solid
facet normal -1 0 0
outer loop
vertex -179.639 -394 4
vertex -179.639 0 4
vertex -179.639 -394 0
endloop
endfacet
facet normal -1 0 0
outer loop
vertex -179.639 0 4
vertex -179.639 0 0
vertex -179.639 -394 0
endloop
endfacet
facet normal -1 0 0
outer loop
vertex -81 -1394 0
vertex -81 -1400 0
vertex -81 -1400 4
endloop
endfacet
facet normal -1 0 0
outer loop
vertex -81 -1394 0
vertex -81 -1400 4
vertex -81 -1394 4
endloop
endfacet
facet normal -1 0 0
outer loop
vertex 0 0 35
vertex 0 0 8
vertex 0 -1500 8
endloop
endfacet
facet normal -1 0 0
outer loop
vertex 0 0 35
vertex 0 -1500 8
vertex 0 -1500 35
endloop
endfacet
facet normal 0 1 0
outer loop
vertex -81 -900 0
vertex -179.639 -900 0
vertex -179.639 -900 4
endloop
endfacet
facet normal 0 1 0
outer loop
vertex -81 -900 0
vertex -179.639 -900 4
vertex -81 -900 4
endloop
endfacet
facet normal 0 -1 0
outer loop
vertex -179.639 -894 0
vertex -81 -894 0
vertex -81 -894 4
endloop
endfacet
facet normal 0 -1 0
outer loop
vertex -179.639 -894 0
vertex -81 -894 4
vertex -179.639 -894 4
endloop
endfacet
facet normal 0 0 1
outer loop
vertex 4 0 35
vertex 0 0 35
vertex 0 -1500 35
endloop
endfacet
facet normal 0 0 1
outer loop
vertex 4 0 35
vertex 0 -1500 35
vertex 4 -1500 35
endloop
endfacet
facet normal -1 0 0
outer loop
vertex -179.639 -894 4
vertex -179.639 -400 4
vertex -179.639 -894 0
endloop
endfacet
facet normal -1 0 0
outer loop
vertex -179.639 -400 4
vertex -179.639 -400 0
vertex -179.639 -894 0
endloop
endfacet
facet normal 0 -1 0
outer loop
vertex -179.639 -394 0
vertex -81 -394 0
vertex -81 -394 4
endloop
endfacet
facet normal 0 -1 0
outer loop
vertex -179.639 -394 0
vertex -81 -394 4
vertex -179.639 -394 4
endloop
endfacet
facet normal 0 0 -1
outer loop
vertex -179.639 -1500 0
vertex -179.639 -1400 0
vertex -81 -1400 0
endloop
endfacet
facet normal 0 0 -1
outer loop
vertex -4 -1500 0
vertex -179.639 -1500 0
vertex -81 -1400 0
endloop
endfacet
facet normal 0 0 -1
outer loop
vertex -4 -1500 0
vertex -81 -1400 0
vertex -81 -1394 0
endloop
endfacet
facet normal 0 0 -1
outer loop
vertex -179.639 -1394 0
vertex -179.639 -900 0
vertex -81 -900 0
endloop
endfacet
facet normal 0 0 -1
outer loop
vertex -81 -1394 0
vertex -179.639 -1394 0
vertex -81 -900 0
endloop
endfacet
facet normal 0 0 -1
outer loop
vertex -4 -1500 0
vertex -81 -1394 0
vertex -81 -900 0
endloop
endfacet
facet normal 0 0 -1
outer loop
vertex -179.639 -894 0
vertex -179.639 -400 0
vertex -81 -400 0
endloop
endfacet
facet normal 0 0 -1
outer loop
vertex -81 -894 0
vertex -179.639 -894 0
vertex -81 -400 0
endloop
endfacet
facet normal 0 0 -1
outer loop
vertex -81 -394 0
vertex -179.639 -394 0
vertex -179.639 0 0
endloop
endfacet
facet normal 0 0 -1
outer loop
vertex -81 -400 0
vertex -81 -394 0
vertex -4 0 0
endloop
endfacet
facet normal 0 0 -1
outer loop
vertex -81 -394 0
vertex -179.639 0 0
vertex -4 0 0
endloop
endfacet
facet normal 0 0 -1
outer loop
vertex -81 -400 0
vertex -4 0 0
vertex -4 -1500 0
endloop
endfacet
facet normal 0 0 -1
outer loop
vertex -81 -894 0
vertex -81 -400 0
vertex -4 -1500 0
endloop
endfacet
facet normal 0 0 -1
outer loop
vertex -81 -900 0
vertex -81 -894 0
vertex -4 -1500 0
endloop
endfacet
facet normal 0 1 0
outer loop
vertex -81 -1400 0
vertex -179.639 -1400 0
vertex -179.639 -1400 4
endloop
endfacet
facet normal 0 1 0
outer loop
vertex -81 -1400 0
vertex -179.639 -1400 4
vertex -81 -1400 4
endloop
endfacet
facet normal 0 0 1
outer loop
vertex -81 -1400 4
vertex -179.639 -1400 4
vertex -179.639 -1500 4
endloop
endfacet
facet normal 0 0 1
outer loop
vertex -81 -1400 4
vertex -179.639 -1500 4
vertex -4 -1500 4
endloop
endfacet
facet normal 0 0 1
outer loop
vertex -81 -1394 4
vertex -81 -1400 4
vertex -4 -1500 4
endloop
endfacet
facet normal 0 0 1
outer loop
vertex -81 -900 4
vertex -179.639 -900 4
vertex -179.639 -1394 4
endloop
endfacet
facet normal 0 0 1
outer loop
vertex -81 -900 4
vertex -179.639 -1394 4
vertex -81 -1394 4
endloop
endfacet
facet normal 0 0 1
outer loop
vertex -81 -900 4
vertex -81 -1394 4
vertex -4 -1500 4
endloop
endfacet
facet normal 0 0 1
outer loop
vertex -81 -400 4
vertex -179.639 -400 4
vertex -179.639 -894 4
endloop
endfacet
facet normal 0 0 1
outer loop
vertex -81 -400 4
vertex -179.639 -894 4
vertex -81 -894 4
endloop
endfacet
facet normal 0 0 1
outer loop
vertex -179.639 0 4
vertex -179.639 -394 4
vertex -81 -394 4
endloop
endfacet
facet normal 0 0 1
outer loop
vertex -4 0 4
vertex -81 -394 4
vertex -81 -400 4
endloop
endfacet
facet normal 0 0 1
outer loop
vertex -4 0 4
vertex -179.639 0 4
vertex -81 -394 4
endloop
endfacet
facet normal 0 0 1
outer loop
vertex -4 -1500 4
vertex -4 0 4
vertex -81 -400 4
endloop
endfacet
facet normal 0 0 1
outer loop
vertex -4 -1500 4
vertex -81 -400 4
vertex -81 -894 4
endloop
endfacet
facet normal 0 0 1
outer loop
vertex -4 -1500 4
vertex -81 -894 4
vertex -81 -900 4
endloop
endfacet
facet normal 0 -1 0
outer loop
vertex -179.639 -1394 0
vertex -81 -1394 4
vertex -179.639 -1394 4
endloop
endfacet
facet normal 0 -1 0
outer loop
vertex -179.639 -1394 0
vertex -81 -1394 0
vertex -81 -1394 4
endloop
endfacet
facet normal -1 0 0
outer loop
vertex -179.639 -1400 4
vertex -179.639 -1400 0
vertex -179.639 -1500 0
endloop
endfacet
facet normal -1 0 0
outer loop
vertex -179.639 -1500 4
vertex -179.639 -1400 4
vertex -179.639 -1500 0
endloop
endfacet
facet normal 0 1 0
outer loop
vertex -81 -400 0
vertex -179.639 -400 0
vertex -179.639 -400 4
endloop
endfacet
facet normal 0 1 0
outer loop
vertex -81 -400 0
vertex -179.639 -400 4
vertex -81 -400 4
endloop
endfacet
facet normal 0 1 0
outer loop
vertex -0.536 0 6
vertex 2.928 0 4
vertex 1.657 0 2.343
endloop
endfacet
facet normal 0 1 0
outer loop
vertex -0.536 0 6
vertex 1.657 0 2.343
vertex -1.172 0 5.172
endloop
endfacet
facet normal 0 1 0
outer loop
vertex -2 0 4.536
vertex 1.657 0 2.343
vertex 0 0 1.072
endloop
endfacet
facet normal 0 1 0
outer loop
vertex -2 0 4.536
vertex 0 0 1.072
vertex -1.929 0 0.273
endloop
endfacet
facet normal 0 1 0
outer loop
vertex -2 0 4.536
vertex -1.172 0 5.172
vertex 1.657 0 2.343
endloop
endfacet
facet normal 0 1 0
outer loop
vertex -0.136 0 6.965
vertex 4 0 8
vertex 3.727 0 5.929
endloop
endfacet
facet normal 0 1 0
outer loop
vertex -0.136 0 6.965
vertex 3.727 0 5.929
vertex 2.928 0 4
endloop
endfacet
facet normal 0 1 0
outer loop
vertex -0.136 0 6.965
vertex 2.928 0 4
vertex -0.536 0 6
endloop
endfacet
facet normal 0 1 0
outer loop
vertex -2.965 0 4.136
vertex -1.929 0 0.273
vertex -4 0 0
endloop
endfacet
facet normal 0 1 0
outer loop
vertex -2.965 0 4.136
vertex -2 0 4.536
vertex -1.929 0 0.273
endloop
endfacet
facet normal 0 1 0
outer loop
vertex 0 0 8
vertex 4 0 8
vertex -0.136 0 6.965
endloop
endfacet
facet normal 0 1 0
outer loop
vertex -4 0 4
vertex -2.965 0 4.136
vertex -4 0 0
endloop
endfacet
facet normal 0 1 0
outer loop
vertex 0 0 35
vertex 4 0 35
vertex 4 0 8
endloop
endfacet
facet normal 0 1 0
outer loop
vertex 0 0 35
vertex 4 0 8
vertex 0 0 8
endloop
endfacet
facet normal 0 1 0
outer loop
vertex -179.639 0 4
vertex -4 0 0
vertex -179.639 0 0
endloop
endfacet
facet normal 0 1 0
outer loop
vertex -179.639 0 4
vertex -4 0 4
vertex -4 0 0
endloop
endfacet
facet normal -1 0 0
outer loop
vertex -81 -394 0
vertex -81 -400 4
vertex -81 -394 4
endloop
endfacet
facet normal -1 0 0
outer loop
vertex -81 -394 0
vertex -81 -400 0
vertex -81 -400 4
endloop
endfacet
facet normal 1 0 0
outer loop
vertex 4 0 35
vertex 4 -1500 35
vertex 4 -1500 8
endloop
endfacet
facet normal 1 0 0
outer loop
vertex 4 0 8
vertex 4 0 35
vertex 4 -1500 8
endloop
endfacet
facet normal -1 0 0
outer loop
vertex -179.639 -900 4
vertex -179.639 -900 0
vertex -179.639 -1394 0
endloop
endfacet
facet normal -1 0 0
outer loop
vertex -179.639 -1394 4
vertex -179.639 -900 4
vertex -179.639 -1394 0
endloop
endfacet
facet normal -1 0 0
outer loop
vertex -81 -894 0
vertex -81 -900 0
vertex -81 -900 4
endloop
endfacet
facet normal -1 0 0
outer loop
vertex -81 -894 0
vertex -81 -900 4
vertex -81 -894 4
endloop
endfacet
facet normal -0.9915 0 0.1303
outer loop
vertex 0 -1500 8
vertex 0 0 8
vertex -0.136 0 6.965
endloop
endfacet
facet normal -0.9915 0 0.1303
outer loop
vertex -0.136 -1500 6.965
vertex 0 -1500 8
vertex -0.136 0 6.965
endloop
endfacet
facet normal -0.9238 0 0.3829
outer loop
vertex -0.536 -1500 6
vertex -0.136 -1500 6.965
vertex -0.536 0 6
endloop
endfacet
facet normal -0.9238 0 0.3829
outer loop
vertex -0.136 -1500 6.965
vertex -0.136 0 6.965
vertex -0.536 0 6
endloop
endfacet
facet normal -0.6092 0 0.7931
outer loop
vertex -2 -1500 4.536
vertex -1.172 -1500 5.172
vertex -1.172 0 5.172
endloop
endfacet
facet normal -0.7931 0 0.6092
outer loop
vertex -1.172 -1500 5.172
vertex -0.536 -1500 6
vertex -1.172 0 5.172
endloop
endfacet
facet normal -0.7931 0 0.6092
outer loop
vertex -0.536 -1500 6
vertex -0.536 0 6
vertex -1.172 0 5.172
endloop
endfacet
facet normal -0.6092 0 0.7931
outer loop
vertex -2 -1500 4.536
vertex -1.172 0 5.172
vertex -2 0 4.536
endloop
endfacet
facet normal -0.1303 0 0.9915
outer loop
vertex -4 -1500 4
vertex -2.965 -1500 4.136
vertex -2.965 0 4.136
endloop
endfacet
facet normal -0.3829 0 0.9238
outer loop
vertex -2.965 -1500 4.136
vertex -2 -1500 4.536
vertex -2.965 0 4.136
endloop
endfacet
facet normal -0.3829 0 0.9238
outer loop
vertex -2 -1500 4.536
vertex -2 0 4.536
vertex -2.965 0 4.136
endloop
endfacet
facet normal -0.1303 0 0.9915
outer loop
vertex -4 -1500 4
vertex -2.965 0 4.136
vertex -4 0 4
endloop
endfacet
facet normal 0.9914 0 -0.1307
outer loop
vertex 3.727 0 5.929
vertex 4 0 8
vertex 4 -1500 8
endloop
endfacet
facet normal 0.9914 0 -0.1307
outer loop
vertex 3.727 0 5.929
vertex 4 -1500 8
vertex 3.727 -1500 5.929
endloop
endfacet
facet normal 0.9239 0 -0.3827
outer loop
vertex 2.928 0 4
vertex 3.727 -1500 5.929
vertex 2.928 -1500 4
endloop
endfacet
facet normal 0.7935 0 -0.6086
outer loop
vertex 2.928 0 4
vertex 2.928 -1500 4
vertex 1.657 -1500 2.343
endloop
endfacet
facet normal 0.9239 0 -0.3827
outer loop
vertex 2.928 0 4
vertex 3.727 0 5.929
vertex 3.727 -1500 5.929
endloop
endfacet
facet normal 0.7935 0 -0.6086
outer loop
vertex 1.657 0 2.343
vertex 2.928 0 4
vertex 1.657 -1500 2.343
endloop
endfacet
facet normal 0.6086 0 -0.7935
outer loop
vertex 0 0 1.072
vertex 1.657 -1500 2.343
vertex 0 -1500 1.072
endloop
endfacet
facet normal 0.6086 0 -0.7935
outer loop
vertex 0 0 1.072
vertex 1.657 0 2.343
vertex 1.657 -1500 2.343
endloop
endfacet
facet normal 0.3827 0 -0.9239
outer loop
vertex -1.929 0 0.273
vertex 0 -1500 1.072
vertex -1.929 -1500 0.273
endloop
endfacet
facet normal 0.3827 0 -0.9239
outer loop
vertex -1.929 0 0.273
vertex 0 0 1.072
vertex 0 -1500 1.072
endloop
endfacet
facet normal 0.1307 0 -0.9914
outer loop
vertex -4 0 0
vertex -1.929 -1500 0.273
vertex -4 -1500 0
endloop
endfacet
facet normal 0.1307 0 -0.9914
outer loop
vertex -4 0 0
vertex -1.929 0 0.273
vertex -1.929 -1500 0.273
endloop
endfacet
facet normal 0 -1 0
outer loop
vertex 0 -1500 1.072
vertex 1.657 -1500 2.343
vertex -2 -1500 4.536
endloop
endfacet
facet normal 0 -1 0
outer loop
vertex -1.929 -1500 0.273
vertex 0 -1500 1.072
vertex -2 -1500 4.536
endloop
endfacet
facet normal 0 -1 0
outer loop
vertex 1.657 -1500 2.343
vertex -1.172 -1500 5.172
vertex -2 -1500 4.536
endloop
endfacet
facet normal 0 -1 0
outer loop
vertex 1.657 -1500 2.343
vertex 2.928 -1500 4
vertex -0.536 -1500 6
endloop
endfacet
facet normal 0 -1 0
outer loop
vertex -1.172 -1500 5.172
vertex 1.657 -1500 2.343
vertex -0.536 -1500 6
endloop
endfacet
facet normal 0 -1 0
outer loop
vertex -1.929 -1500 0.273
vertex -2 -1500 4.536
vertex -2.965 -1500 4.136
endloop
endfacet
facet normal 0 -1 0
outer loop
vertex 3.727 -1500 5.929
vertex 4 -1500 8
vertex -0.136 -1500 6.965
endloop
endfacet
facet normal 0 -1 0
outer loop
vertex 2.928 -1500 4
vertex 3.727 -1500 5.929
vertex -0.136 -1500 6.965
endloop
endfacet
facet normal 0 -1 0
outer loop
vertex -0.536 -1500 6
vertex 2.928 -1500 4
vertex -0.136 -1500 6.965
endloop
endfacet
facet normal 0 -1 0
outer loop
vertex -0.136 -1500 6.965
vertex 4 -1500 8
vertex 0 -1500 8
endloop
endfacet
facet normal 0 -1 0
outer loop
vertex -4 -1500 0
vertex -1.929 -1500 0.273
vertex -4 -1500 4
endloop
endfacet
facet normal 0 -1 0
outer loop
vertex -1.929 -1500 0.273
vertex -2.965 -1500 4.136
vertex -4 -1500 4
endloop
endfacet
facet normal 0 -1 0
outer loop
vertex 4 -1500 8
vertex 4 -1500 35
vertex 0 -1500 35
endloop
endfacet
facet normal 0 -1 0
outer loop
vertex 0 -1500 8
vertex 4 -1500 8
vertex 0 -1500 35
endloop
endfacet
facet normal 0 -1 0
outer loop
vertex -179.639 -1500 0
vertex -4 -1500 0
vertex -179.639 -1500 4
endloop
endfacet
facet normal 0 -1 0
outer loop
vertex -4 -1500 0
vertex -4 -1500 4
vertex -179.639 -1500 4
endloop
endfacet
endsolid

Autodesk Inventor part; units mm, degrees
ref_plane "YZ Plane" through (0, 0, 0) normal (1, 0, 0) x (0, 1, 0)
ref_plane "XZ Plane" through (0, 0, 0) normal (0, 1, 0) x (-1, 0, 0)
ref_plane "XY Plane" through (0, 0, 0) normal (0, 0, 1) x (1, 0, 0)
sketch "Sketch1" plane through (0, 0, 0) normal (0, 0, 1) x (1, 0, 0)
  line L0 (0, 0) -> (-179.6388, 0)
  line L1 (-179.6388, 0) -> (-179.6388, -1500)
  line L2 (-179.6388, -1500) -> (0, -1500)
  line L3 (0, -1500) -> (0, 0)
  line L4 (-179.6388, -1400) -> (-81, -1400)
  line L5 (-81, -1400) -> (-81, -1394)
  line L6 (-81, -1394) -> (-179.6388, -1394)
  line L7 (-179.6388, -1394) -> (-179.6388, -1400)
  line L8 (-179.6388, -900) -> (-81, -900)
  line L9 (-81, -900) -> (-81, -894)
  line L10 (-81, -894) -> (-179.6388, -894)
  line L11 (-179.6388, -894) -> (-179.6388, -900)
  line L12 (-179.6388, -400) -> (-81, -400)
  line L13 (-81, -400) -> (-81, -394)
  line L14 (-81, -394) -> (-179.6388, -394)
  line L15 (-179.6388, -394) -> (-179.6388, -400)
  point P0 (-179.6388, -394)
  point P1 (-179.6388, -400)
  point P2 (-179.6388, -1394)
  dimension "d0" = 1500
  dimension "d1" = 179.6388
  dimension "d2" = 6
  dimension "d4" = 100
  dimension "d7" = 500
  dimension "d23" = 81
extrude "Plate1" add sketch "Sketch1" along normal blind 4 contours L3 L2 L1 L4 L5 L6 L8 L9 L10 L12 L13 L14 L0
sketch "Sketch2" plane through (4, 0, 0) normal (-1, 0, 0) x (0, -1, 0)
  line L0 (1500, 0) -> (0, 0)
  line L1 (0, 0) -> (0, 35)
  line L2 (0, 35) -> (1500, 35)
  line L3 (1500, 35) -> (1500, 0)
edge flange "Flange1" height 35 angle 90 thickness 4 bend radius 4 thickness toward (-1, 0, 0) relief tear relief width 4 relief depth 2 edges at (0, -750, 4) wall of the first edge with corners at (4, -1500, 0) (4, 0, 0) (4, 0, 35) (4, -1500, 35)
bend "Bend1"
corner "Corner1"
equation "\"d1\" = Stringer2_deep"
equation "\"d12\" = Thickness"
equation "\"d13\" = BendReliefWidth"
equation "\"d14\" = BendReliefDepth"
equation "\"d15\" = MinimumRemnant"
equation "\"d16\" = TransitionRadius"
equation "\"d19\" = BendRadius"
equation "\"d20\" = CornerReliefSize"
equation "\"d21\" = GapSize"
equation "\"d22\" = JacobiRadiusSize"
equation "\"BendRadius\" = Thickness"
equation "\"BendReliefWidth\" = Thickness"
equation "\"BendReliefDepth\" = 0.5 * Thickness"
equation "\"CornerReliefSize\" = 4 * Thickness"
equation "\"MinimumRemnant\" = 2 * Thickness"
equation "\"TransitionRadius\" = BendRadius"
equation "\"JacobiRadiusSize\" = BendRadius"
equation "\"GapSize\" = Thickness"
equation "\"Stringer2_deep\" = 179.638781"
equation "\"Thickness\" = 4"
properties part number "stringer 1.2" material "Steel"
